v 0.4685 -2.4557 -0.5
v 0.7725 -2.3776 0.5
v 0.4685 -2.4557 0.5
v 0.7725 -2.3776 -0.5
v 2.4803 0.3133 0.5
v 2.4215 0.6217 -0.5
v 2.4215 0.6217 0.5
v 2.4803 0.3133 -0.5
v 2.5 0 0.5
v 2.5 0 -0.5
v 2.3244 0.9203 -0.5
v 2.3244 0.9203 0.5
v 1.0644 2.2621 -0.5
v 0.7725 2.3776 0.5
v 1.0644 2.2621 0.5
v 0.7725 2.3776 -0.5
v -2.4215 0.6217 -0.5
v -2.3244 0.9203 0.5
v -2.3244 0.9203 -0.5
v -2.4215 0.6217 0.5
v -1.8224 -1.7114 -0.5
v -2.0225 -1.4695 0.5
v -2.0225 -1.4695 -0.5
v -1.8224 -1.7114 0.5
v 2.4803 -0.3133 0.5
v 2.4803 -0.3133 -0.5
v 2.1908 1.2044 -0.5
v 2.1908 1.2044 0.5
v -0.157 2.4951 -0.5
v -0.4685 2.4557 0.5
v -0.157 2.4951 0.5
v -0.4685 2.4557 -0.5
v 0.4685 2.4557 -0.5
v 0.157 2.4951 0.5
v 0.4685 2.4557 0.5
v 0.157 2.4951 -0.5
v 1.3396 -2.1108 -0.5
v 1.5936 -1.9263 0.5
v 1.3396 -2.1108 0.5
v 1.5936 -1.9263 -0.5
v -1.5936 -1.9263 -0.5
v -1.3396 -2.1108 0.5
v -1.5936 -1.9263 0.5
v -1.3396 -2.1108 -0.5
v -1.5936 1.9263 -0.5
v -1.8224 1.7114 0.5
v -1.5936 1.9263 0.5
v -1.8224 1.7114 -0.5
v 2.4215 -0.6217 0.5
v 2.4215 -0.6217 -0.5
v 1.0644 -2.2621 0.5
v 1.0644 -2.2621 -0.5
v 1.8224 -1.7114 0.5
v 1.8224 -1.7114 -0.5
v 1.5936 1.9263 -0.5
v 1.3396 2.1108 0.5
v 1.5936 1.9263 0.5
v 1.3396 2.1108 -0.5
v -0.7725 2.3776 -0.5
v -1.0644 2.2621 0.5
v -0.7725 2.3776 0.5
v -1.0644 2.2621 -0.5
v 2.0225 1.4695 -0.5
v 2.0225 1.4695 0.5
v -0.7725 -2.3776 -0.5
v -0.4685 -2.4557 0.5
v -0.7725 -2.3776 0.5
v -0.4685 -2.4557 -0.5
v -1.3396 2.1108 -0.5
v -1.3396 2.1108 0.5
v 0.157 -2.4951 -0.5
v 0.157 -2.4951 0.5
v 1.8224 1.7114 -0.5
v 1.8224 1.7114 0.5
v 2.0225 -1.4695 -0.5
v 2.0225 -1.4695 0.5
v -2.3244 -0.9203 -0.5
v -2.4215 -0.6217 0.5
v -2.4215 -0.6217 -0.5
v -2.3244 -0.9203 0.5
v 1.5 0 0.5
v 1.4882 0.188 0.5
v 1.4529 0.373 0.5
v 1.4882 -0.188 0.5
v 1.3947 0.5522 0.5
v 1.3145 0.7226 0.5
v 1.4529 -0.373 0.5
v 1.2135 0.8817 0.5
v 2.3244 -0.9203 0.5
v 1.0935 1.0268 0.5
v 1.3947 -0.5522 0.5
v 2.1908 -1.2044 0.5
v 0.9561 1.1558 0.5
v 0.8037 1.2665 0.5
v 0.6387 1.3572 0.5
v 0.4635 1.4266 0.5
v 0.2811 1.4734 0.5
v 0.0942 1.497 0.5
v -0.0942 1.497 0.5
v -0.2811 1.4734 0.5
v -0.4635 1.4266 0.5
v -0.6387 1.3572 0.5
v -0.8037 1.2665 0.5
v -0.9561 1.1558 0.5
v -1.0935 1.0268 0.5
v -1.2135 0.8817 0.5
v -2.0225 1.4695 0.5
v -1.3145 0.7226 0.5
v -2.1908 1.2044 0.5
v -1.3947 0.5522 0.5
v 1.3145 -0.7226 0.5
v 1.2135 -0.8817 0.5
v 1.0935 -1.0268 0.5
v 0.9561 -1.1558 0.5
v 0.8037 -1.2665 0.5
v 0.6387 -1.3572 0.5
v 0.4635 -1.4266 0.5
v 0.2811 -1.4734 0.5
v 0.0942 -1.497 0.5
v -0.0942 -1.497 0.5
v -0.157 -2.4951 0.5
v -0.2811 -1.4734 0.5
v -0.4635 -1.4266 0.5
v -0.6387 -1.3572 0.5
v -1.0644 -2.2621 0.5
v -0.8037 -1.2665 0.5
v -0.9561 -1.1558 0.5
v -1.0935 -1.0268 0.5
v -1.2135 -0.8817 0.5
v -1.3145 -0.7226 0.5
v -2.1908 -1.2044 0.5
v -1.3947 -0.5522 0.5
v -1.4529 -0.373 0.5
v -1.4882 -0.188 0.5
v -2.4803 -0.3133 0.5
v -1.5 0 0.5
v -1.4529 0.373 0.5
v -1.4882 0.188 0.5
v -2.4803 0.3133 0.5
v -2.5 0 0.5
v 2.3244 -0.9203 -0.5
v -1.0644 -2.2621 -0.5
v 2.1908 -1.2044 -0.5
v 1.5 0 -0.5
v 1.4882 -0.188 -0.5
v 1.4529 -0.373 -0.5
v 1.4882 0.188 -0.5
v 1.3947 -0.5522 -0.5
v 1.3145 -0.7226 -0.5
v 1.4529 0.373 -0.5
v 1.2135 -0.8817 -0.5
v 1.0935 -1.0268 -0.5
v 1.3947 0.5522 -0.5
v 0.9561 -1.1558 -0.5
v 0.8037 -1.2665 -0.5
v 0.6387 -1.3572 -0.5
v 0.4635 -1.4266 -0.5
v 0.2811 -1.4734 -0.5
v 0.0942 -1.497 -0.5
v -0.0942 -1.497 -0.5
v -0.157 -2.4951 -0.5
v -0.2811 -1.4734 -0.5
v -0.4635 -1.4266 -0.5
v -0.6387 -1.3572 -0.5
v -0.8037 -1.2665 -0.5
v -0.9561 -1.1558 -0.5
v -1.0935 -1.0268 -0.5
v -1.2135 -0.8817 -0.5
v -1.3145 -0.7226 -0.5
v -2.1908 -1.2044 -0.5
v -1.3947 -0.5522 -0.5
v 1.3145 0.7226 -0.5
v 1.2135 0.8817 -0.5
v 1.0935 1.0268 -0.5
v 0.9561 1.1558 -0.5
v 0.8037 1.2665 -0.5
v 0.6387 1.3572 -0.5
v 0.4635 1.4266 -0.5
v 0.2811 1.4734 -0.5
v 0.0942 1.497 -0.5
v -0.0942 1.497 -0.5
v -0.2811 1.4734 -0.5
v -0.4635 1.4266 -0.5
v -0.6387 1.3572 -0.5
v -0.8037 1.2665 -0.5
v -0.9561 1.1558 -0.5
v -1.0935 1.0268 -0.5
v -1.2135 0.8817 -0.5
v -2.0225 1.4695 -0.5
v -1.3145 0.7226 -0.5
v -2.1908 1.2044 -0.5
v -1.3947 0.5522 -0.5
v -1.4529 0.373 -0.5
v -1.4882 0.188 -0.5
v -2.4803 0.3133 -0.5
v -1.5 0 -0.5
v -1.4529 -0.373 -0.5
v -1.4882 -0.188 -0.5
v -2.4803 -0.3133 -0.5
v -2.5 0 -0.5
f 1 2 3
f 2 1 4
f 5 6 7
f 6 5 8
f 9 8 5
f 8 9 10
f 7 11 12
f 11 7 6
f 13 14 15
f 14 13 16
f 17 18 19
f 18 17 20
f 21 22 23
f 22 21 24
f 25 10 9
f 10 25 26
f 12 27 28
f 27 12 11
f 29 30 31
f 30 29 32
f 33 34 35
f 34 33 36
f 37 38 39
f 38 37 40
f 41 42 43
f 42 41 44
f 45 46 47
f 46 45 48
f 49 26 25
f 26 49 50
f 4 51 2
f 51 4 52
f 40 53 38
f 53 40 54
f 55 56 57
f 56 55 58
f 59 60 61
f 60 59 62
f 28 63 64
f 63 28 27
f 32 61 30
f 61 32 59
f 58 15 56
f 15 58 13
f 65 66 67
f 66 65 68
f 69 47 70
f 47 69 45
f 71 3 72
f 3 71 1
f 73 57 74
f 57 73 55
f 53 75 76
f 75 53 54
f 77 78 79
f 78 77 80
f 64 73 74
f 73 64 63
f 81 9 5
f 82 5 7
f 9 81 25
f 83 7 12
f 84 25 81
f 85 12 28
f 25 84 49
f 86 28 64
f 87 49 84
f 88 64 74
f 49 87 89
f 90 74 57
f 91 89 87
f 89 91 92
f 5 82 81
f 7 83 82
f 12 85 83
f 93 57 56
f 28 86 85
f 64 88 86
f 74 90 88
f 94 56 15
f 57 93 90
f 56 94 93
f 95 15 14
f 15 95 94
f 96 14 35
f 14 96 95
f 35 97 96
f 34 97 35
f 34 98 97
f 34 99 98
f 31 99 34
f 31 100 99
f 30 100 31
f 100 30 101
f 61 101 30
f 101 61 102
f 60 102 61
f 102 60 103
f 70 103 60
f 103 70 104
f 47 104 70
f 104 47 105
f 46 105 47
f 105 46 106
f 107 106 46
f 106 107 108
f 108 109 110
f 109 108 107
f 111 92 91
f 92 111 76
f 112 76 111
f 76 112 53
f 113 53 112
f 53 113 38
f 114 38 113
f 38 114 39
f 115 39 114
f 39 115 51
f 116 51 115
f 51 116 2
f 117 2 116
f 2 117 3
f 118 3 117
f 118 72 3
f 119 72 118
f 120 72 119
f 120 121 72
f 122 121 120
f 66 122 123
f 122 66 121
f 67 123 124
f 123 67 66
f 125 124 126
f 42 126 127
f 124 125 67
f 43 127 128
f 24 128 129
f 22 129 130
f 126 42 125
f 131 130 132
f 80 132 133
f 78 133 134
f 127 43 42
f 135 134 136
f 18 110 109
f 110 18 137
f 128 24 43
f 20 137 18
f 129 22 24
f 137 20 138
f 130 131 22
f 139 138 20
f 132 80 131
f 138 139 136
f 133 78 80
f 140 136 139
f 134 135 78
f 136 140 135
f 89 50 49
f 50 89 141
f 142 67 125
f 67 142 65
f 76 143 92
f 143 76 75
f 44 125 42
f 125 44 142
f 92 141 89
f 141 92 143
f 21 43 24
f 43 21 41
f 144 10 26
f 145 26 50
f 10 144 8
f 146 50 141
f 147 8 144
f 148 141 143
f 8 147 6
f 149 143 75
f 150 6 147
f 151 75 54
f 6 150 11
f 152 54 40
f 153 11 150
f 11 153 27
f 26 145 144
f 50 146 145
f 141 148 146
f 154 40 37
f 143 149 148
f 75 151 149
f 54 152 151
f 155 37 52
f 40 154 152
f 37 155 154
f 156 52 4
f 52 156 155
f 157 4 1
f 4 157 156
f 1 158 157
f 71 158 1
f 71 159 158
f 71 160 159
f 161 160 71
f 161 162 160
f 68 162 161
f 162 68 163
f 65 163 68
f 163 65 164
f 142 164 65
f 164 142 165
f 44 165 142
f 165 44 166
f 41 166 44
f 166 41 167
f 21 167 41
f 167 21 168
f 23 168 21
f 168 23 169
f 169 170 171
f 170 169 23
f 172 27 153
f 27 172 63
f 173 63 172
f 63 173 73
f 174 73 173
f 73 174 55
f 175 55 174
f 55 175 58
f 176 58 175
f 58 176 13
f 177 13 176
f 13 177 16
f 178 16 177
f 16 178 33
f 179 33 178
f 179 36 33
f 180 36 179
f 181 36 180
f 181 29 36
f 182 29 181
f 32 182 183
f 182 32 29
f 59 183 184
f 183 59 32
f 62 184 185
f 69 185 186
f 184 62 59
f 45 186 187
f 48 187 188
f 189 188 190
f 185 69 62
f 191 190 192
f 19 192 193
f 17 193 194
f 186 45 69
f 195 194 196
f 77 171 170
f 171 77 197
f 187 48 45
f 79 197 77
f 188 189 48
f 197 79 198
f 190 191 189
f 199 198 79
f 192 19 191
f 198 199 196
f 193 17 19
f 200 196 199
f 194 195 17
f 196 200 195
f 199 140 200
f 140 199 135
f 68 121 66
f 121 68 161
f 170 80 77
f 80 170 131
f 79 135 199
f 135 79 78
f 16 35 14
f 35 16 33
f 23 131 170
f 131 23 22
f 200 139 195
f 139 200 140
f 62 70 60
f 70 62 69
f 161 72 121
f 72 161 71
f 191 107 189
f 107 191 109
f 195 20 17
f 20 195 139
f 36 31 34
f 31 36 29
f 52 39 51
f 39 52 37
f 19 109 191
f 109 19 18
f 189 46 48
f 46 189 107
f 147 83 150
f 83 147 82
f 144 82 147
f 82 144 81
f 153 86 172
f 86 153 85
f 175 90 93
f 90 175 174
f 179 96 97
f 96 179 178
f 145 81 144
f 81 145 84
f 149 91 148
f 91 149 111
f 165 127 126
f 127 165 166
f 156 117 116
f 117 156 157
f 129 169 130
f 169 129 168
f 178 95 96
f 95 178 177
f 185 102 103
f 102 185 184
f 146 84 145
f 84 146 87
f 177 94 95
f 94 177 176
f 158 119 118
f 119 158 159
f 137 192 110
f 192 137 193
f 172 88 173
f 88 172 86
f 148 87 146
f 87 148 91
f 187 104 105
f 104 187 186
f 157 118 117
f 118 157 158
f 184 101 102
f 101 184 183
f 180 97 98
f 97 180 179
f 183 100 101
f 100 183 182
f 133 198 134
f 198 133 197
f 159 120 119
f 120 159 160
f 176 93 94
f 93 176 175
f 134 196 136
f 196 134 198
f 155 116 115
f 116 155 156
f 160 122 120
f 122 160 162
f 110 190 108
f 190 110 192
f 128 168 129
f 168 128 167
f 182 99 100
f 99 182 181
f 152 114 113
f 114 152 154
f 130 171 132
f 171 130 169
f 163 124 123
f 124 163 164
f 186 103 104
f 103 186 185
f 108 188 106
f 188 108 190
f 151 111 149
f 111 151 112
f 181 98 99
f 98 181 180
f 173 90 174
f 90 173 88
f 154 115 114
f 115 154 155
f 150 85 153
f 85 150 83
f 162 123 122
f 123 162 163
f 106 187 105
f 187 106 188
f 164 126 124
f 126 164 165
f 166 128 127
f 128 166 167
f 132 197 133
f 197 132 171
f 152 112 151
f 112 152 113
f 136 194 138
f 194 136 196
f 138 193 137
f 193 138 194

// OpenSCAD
$fn = 50;


difference() {
	union() {
		translate(v = [0, 0, -0.5000000000]) {
			cylinder(h = 1, r = 2.5000000000);
		}
	}
	union() {
		translate(v = [0, 0, -100.0000000000]) {
			cylinder(h = 200, r = 1.5000000000);
		}
	}
}
